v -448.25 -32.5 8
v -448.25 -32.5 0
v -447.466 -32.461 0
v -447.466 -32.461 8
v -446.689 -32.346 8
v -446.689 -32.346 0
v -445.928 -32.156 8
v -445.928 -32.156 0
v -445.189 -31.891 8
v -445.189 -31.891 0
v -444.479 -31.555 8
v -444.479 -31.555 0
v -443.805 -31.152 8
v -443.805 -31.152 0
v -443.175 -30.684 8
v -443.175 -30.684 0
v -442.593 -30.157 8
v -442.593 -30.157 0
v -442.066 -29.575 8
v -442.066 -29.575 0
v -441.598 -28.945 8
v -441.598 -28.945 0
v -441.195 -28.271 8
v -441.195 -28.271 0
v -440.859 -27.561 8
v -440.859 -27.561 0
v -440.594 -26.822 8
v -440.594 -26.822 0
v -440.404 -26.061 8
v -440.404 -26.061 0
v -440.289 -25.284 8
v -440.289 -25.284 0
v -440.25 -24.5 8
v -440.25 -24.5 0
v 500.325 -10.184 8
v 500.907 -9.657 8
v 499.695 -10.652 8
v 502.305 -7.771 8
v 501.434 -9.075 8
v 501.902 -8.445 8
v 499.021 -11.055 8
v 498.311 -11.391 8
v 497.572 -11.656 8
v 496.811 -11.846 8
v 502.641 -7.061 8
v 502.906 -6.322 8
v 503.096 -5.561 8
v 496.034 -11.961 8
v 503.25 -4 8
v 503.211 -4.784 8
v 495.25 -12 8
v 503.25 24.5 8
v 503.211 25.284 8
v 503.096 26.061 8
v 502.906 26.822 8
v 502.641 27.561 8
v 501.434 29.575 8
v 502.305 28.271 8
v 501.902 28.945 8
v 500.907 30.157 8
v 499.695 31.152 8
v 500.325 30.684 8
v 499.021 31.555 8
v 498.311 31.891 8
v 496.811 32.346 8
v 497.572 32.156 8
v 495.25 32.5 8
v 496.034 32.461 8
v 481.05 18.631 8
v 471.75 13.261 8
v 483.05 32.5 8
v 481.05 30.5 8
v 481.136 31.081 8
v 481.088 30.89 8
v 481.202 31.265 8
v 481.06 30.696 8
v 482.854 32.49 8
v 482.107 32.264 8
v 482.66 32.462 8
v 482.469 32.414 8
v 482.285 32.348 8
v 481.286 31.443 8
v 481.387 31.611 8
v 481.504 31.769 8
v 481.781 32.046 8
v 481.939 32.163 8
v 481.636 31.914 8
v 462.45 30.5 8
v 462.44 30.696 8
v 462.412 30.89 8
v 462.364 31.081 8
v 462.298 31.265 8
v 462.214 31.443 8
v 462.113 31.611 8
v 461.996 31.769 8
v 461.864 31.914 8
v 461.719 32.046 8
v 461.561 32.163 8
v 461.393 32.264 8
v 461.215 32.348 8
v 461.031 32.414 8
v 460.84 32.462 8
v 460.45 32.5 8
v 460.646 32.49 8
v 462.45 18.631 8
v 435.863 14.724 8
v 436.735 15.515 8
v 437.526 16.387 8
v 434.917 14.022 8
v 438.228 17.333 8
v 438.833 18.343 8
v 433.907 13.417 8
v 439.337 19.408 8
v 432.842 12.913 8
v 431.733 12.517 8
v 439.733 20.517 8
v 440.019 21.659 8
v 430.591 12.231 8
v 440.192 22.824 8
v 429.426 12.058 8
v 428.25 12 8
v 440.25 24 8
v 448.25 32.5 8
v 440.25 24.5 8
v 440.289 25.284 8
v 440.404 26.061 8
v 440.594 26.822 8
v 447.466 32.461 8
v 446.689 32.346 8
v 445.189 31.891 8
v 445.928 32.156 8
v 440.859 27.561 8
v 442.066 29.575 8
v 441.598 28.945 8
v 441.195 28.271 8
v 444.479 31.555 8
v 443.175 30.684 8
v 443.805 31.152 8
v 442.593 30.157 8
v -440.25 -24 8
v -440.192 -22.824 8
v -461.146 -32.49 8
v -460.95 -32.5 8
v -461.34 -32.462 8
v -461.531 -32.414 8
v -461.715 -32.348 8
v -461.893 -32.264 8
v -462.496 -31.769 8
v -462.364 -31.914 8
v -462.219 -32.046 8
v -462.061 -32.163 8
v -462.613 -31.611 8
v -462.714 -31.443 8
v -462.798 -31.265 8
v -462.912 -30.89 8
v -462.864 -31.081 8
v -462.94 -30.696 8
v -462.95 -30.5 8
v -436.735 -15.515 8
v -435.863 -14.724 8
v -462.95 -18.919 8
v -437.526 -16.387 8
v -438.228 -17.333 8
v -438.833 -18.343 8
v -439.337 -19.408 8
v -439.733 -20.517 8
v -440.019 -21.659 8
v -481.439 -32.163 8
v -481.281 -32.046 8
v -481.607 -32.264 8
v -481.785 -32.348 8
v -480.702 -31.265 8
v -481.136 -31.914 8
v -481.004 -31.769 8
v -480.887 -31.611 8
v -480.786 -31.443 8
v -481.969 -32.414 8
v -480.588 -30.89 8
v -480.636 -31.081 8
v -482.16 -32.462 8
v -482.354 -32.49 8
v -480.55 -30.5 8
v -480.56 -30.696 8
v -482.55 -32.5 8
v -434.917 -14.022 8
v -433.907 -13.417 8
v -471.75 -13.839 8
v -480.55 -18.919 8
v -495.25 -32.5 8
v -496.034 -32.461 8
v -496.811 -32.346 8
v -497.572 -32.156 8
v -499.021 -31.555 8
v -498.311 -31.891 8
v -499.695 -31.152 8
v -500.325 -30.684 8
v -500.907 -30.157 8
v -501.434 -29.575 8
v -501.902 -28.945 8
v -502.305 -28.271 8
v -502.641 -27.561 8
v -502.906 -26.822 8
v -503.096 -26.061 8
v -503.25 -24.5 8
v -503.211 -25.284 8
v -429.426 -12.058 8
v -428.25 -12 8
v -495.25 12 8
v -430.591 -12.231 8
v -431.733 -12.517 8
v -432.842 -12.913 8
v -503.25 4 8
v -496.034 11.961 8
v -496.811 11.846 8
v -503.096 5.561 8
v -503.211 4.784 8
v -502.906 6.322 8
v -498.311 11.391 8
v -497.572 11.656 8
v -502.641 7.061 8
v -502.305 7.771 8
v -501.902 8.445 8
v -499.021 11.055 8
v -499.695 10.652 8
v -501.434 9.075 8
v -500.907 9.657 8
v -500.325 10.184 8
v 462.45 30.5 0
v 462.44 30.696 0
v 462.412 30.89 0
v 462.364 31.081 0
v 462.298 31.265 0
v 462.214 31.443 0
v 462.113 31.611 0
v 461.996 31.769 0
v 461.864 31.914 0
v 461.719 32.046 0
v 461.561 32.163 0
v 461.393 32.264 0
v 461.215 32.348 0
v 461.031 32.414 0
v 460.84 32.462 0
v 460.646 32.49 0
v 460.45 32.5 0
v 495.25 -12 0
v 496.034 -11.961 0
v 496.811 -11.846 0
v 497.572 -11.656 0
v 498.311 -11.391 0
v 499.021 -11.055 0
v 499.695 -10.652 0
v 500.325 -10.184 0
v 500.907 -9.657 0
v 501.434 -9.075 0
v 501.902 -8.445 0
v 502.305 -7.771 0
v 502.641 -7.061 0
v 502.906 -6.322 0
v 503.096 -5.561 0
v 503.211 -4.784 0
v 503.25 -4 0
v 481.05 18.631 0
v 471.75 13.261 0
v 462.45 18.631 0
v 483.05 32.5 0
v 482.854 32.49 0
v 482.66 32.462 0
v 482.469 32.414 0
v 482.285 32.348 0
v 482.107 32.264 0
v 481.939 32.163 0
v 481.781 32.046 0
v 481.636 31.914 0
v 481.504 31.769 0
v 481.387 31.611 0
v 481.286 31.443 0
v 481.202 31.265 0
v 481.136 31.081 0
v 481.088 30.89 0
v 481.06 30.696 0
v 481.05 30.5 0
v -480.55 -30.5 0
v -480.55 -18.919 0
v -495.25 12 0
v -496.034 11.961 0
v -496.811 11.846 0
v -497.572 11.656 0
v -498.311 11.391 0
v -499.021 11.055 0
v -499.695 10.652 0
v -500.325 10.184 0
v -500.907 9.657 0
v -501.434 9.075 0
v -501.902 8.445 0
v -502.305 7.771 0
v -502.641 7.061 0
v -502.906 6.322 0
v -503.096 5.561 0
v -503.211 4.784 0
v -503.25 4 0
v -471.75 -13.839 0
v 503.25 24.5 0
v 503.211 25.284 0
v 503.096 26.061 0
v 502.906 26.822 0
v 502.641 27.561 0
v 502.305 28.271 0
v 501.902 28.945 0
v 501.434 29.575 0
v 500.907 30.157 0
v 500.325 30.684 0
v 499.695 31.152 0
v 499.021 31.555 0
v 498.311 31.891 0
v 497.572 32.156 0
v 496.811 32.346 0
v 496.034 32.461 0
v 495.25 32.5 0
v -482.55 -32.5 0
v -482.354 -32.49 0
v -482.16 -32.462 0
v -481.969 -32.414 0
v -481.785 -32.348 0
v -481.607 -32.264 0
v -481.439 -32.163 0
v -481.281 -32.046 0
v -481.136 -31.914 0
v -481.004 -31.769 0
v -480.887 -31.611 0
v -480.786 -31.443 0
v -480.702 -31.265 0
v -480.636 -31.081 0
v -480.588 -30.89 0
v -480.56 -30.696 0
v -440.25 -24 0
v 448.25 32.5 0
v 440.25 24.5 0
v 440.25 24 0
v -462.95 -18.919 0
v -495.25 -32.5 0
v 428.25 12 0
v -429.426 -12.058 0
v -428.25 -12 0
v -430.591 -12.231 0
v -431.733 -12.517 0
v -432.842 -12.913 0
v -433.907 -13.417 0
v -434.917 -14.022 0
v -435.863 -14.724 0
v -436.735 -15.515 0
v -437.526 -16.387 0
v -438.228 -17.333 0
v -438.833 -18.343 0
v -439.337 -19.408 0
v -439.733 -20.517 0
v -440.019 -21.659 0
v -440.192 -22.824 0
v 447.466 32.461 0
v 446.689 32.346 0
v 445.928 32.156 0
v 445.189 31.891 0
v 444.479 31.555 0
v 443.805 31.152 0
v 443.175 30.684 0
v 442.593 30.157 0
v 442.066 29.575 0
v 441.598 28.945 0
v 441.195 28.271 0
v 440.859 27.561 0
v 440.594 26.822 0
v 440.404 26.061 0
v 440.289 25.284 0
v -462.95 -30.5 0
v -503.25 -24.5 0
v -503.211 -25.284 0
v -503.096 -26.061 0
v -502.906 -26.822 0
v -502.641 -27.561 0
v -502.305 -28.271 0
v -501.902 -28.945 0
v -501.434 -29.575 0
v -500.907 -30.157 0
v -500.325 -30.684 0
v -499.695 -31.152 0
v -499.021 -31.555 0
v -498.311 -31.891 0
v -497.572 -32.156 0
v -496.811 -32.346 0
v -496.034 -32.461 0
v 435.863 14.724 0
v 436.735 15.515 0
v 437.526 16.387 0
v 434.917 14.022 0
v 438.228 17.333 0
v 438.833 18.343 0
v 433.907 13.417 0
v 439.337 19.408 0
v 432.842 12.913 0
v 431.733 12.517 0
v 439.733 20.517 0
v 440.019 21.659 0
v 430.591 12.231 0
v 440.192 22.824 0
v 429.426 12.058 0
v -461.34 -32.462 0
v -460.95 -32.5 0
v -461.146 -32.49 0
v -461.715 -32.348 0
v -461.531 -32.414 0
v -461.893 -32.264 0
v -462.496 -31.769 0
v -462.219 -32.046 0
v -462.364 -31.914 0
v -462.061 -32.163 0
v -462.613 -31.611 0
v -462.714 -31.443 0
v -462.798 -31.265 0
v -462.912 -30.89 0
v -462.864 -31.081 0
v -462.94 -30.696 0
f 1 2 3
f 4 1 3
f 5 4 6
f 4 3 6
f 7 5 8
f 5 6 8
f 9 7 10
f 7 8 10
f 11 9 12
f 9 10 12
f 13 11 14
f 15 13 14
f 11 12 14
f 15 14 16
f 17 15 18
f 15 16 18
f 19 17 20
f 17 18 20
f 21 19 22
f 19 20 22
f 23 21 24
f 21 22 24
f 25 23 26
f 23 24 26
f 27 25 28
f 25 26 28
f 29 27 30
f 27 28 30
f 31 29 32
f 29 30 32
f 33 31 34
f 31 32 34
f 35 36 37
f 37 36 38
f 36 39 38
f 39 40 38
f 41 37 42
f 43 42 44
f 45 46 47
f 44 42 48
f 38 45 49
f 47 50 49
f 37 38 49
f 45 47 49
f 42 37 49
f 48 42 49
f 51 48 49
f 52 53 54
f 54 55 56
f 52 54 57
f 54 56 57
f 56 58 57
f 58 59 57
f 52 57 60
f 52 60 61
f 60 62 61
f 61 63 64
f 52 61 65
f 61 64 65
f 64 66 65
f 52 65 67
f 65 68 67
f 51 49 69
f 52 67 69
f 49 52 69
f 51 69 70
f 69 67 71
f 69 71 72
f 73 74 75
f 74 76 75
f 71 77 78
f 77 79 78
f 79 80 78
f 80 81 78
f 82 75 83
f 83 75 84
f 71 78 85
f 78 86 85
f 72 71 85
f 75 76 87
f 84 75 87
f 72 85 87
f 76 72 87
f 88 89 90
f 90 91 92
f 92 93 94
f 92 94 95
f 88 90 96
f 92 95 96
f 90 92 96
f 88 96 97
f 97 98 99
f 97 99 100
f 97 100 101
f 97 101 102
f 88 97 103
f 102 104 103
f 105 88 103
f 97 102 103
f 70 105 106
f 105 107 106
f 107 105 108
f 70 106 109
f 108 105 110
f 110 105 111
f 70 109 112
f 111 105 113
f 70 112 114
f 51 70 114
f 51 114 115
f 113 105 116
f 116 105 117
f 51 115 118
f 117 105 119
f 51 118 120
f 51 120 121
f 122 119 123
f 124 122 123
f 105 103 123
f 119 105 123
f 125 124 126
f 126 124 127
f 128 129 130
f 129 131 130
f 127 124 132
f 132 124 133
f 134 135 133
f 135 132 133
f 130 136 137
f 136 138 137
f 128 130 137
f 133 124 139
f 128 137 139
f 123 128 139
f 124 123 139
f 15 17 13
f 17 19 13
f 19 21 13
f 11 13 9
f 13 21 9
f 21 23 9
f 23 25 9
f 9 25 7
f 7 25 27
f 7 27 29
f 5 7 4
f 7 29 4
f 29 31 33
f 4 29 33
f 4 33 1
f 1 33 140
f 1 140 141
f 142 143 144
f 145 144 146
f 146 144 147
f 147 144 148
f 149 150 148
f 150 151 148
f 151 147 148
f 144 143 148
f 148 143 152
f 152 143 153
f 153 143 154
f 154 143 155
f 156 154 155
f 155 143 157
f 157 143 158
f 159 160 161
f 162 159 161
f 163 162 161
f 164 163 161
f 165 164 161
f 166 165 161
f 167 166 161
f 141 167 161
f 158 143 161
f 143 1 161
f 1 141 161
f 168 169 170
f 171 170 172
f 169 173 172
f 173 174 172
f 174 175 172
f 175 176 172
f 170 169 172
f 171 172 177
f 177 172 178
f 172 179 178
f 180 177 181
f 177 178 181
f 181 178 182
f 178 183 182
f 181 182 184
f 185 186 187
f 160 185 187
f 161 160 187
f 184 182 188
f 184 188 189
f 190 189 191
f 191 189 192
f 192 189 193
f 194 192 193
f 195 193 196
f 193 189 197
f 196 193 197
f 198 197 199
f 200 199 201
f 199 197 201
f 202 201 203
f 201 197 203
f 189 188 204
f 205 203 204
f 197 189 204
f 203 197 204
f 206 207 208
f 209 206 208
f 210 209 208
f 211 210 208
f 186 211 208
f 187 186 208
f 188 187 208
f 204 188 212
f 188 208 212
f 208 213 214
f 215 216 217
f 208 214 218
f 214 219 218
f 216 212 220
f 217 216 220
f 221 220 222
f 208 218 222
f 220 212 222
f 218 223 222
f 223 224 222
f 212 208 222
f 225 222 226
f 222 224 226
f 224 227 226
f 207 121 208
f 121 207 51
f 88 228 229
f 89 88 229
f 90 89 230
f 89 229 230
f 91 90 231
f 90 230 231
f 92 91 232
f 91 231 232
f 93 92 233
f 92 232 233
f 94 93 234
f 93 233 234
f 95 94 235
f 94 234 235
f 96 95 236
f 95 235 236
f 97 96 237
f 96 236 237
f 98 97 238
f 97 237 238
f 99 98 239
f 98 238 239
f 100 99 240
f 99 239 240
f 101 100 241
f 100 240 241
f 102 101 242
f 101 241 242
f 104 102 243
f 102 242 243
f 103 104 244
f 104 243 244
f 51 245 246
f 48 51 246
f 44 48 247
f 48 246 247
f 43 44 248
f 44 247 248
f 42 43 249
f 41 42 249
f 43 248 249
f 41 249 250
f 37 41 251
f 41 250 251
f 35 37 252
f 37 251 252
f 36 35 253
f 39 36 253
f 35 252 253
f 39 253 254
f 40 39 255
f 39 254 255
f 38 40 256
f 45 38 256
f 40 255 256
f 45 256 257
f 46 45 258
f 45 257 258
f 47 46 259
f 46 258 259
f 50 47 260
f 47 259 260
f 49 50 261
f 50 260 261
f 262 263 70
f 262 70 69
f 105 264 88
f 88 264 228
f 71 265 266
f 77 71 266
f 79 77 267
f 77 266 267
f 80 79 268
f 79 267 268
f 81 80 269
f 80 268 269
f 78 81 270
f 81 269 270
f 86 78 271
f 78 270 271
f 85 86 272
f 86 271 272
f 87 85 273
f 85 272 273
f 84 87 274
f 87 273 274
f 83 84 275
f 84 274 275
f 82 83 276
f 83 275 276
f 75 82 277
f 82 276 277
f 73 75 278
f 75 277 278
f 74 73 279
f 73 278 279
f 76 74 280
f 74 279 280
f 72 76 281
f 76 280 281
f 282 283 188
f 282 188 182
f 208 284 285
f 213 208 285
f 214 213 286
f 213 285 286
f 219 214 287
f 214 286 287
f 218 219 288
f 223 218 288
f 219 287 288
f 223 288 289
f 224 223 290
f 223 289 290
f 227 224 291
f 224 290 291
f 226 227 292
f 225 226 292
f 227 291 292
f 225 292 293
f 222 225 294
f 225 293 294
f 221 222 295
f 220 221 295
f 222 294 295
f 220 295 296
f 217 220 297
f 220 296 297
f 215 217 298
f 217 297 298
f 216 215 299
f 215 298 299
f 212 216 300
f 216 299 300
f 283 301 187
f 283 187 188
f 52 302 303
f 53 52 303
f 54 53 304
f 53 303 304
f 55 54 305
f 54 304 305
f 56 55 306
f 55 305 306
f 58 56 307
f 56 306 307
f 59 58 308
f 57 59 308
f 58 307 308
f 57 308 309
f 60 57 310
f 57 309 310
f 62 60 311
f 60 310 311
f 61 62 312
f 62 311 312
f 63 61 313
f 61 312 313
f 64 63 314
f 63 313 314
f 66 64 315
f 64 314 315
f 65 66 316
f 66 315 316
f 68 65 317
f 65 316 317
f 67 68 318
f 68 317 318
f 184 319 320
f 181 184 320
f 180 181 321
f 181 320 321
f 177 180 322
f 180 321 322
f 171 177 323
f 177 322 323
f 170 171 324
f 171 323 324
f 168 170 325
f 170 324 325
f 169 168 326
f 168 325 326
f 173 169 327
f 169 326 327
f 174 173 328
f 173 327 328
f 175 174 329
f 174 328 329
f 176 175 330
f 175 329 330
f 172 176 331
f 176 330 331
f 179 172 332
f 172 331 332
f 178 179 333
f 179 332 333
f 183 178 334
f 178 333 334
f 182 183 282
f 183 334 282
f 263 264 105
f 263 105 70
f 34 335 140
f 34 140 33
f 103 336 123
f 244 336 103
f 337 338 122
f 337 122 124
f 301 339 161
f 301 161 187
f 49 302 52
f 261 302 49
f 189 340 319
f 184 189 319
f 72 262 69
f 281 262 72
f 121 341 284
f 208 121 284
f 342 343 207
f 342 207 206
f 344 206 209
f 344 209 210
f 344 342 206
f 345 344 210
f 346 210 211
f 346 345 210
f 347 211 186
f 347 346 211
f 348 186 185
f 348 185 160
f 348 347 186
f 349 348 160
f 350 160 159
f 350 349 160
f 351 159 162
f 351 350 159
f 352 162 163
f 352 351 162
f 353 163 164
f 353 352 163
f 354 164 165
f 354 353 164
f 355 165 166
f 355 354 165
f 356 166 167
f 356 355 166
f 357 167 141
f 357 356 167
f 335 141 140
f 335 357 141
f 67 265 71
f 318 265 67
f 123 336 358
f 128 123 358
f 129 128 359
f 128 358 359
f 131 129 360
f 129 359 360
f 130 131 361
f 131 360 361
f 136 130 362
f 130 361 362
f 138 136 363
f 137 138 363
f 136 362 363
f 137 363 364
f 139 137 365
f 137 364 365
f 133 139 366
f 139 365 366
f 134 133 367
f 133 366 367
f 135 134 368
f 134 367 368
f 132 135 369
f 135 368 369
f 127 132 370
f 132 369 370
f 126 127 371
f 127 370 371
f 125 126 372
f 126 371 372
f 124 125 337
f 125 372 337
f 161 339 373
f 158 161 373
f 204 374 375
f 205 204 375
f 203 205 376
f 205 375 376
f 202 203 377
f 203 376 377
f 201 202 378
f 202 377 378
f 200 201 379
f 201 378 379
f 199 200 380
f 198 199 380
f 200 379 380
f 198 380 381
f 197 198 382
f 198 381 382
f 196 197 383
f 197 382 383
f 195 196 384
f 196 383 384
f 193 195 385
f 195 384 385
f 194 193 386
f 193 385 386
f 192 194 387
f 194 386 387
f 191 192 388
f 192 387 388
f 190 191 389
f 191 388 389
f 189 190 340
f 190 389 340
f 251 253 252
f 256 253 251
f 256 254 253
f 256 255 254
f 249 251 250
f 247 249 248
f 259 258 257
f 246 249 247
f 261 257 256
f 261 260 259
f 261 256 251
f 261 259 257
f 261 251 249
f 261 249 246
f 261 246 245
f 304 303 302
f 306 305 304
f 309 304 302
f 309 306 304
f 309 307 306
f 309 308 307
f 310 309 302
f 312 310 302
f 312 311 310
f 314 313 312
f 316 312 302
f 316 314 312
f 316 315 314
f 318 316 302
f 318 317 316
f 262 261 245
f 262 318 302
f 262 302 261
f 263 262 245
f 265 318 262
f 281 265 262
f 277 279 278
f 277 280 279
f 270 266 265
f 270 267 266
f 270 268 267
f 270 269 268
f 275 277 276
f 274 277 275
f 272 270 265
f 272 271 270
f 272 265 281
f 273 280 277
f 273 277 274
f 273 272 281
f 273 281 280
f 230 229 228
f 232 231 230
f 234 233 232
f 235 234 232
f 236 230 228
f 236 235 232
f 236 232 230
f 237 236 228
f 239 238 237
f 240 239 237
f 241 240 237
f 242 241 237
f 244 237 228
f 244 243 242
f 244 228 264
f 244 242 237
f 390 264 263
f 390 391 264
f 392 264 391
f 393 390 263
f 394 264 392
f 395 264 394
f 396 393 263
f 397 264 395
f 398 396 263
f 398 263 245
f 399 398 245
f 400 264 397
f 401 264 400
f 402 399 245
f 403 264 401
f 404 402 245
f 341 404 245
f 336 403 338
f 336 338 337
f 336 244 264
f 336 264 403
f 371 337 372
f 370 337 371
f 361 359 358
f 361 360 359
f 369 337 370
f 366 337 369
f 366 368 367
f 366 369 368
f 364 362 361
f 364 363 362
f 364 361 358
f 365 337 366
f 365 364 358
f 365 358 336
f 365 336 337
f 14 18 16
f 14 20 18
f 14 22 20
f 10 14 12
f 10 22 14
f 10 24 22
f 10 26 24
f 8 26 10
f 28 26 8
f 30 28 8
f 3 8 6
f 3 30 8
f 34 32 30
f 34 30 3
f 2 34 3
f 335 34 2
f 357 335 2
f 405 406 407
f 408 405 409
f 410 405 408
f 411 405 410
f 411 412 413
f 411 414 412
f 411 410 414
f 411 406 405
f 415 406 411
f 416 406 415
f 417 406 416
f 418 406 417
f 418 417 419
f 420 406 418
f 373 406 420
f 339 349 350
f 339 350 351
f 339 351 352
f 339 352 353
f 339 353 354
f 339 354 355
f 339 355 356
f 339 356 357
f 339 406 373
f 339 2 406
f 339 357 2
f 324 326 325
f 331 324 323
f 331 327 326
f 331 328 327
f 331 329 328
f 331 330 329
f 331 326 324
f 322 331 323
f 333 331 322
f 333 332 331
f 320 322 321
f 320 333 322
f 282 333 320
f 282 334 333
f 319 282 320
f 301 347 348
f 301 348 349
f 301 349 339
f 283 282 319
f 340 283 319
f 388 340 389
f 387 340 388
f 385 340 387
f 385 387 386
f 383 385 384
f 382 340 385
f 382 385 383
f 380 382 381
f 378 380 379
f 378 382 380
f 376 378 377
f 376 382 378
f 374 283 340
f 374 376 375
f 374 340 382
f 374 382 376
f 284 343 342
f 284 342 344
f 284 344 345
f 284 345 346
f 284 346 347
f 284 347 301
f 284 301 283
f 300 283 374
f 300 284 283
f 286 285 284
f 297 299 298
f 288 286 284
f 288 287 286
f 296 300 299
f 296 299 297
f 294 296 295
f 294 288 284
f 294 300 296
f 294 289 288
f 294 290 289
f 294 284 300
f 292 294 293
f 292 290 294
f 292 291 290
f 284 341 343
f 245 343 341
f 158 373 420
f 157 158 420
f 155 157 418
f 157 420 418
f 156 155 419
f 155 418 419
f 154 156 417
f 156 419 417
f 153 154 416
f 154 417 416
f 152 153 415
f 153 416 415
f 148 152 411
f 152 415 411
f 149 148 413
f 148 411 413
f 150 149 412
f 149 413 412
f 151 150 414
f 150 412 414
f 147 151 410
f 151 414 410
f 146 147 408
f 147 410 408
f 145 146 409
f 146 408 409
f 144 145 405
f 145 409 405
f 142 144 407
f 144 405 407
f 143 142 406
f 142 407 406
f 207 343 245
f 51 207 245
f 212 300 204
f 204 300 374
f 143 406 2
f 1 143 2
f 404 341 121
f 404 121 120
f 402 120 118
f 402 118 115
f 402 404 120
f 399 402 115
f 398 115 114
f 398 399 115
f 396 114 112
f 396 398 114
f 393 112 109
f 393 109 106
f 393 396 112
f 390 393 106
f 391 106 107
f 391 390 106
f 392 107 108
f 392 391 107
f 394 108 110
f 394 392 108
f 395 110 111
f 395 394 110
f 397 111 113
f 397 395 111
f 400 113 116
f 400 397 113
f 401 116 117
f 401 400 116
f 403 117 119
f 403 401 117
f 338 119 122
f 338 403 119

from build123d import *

# Parameters (mm, degrees)
PAD_DEPTH = 8


with BuildPart() as part:
    # Sketch → Pad (new body)
    with BuildSketch(Plane.XY):
        with BuildLine():
            Line((-428.25, 12), (428.25, 12))
            ThreePointArc((428.25, 12), (436.735281, 15.514719), (440.25, 24))
            Line((440.25, 24), (440.25, 24.5))
            ThreePointArc((448.25, 32.5), (442.593146, 30.156854), (440.25, 24.5))
            Line((448.25, 32.5), (460.45, 32.5))
            ThreePointArc((462.45, 30.5), (461.864214, 31.914214), (460.45, 32.5))
            Line((462.45, 29.369358), (462.45, 30.5))
            Line((462.45, 29.369358), (462.45, 18.630642))
            Line((462.45, 18.630642), (471.75, 13.261285))
            Line((471.75, 13.261285), (481.05, 18.630642))
            Line((481.05, 18.630642), (481.05, 29.369358))
            Line((481.05, 29.369358), (481.05, 30.5))
            ThreePointArc((483.05, 32.5), (481.635786, 31.914214), (481.05, 30.5))
            Line((483.05, 32.5), (495.25, 32.5))
            ThreePointArc((503.25, 24.5), (500.906854, 30.156854), (495.25, 32.5))
            Line((503.25, 24.5), (503.25, -4))
            ThreePointArc((495.25, -12), (500.906854, -9.656854), (503.25, -4))
            Line((428.25, -12), (495.25, -12))
            Line((-428.25, -12), (428.25, -12))
            ThreePointArc((-428.25, -12), (-436.735281, -15.514719), (-440.25, -24))
            Line((-440.25, -24), (-440.25, -24.5))
            ThreePointArc((-448.25, -32.5), (-442.593146, -30.156854), (-440.25, -24.5))
            Line((-460.95, -32.5), (-448.25, -32.5))
            ThreePointArc((-462.95, -30.5), (-462.364214, -31.914214), (-460.95, -32.5))
            Line((-462.95, -29.080682), (-462.95, -30.5))
            Line((-462.95, -29.080682), (-462.95, -18.919318))
            Line((-462.95, -18.919318), (-471.75, -13.838635))
            Line((-471.75, -13.838635), (-480.55, -18.919318))
            Line((-480.55, -18.919318), (-480.55, -29.080682))
            Line((-480.55, -29.080682), (-480.55, -30.5))
            ThreePointArc((-482.55, -32.5), (-481.135786, -31.914214), (-480.55, -30.5))
            Line((-495.25, -32.5), (-482.55, -32.5))
            ThreePointArc((-503.25, -24.5), (-500.906854, -30.156854), (-495.25, -32.5))
            Line((-503.25, 4), (-503.25, -24.5))
            ThreePointArc((-495.25, 12), (-500.906854, 9.656854), (-503.25, 4))
            Line((-428.25, 12), (-495.25, 12))
        make_face()
    extrude(amount=PAD_DEPTH)


solid = part.part
